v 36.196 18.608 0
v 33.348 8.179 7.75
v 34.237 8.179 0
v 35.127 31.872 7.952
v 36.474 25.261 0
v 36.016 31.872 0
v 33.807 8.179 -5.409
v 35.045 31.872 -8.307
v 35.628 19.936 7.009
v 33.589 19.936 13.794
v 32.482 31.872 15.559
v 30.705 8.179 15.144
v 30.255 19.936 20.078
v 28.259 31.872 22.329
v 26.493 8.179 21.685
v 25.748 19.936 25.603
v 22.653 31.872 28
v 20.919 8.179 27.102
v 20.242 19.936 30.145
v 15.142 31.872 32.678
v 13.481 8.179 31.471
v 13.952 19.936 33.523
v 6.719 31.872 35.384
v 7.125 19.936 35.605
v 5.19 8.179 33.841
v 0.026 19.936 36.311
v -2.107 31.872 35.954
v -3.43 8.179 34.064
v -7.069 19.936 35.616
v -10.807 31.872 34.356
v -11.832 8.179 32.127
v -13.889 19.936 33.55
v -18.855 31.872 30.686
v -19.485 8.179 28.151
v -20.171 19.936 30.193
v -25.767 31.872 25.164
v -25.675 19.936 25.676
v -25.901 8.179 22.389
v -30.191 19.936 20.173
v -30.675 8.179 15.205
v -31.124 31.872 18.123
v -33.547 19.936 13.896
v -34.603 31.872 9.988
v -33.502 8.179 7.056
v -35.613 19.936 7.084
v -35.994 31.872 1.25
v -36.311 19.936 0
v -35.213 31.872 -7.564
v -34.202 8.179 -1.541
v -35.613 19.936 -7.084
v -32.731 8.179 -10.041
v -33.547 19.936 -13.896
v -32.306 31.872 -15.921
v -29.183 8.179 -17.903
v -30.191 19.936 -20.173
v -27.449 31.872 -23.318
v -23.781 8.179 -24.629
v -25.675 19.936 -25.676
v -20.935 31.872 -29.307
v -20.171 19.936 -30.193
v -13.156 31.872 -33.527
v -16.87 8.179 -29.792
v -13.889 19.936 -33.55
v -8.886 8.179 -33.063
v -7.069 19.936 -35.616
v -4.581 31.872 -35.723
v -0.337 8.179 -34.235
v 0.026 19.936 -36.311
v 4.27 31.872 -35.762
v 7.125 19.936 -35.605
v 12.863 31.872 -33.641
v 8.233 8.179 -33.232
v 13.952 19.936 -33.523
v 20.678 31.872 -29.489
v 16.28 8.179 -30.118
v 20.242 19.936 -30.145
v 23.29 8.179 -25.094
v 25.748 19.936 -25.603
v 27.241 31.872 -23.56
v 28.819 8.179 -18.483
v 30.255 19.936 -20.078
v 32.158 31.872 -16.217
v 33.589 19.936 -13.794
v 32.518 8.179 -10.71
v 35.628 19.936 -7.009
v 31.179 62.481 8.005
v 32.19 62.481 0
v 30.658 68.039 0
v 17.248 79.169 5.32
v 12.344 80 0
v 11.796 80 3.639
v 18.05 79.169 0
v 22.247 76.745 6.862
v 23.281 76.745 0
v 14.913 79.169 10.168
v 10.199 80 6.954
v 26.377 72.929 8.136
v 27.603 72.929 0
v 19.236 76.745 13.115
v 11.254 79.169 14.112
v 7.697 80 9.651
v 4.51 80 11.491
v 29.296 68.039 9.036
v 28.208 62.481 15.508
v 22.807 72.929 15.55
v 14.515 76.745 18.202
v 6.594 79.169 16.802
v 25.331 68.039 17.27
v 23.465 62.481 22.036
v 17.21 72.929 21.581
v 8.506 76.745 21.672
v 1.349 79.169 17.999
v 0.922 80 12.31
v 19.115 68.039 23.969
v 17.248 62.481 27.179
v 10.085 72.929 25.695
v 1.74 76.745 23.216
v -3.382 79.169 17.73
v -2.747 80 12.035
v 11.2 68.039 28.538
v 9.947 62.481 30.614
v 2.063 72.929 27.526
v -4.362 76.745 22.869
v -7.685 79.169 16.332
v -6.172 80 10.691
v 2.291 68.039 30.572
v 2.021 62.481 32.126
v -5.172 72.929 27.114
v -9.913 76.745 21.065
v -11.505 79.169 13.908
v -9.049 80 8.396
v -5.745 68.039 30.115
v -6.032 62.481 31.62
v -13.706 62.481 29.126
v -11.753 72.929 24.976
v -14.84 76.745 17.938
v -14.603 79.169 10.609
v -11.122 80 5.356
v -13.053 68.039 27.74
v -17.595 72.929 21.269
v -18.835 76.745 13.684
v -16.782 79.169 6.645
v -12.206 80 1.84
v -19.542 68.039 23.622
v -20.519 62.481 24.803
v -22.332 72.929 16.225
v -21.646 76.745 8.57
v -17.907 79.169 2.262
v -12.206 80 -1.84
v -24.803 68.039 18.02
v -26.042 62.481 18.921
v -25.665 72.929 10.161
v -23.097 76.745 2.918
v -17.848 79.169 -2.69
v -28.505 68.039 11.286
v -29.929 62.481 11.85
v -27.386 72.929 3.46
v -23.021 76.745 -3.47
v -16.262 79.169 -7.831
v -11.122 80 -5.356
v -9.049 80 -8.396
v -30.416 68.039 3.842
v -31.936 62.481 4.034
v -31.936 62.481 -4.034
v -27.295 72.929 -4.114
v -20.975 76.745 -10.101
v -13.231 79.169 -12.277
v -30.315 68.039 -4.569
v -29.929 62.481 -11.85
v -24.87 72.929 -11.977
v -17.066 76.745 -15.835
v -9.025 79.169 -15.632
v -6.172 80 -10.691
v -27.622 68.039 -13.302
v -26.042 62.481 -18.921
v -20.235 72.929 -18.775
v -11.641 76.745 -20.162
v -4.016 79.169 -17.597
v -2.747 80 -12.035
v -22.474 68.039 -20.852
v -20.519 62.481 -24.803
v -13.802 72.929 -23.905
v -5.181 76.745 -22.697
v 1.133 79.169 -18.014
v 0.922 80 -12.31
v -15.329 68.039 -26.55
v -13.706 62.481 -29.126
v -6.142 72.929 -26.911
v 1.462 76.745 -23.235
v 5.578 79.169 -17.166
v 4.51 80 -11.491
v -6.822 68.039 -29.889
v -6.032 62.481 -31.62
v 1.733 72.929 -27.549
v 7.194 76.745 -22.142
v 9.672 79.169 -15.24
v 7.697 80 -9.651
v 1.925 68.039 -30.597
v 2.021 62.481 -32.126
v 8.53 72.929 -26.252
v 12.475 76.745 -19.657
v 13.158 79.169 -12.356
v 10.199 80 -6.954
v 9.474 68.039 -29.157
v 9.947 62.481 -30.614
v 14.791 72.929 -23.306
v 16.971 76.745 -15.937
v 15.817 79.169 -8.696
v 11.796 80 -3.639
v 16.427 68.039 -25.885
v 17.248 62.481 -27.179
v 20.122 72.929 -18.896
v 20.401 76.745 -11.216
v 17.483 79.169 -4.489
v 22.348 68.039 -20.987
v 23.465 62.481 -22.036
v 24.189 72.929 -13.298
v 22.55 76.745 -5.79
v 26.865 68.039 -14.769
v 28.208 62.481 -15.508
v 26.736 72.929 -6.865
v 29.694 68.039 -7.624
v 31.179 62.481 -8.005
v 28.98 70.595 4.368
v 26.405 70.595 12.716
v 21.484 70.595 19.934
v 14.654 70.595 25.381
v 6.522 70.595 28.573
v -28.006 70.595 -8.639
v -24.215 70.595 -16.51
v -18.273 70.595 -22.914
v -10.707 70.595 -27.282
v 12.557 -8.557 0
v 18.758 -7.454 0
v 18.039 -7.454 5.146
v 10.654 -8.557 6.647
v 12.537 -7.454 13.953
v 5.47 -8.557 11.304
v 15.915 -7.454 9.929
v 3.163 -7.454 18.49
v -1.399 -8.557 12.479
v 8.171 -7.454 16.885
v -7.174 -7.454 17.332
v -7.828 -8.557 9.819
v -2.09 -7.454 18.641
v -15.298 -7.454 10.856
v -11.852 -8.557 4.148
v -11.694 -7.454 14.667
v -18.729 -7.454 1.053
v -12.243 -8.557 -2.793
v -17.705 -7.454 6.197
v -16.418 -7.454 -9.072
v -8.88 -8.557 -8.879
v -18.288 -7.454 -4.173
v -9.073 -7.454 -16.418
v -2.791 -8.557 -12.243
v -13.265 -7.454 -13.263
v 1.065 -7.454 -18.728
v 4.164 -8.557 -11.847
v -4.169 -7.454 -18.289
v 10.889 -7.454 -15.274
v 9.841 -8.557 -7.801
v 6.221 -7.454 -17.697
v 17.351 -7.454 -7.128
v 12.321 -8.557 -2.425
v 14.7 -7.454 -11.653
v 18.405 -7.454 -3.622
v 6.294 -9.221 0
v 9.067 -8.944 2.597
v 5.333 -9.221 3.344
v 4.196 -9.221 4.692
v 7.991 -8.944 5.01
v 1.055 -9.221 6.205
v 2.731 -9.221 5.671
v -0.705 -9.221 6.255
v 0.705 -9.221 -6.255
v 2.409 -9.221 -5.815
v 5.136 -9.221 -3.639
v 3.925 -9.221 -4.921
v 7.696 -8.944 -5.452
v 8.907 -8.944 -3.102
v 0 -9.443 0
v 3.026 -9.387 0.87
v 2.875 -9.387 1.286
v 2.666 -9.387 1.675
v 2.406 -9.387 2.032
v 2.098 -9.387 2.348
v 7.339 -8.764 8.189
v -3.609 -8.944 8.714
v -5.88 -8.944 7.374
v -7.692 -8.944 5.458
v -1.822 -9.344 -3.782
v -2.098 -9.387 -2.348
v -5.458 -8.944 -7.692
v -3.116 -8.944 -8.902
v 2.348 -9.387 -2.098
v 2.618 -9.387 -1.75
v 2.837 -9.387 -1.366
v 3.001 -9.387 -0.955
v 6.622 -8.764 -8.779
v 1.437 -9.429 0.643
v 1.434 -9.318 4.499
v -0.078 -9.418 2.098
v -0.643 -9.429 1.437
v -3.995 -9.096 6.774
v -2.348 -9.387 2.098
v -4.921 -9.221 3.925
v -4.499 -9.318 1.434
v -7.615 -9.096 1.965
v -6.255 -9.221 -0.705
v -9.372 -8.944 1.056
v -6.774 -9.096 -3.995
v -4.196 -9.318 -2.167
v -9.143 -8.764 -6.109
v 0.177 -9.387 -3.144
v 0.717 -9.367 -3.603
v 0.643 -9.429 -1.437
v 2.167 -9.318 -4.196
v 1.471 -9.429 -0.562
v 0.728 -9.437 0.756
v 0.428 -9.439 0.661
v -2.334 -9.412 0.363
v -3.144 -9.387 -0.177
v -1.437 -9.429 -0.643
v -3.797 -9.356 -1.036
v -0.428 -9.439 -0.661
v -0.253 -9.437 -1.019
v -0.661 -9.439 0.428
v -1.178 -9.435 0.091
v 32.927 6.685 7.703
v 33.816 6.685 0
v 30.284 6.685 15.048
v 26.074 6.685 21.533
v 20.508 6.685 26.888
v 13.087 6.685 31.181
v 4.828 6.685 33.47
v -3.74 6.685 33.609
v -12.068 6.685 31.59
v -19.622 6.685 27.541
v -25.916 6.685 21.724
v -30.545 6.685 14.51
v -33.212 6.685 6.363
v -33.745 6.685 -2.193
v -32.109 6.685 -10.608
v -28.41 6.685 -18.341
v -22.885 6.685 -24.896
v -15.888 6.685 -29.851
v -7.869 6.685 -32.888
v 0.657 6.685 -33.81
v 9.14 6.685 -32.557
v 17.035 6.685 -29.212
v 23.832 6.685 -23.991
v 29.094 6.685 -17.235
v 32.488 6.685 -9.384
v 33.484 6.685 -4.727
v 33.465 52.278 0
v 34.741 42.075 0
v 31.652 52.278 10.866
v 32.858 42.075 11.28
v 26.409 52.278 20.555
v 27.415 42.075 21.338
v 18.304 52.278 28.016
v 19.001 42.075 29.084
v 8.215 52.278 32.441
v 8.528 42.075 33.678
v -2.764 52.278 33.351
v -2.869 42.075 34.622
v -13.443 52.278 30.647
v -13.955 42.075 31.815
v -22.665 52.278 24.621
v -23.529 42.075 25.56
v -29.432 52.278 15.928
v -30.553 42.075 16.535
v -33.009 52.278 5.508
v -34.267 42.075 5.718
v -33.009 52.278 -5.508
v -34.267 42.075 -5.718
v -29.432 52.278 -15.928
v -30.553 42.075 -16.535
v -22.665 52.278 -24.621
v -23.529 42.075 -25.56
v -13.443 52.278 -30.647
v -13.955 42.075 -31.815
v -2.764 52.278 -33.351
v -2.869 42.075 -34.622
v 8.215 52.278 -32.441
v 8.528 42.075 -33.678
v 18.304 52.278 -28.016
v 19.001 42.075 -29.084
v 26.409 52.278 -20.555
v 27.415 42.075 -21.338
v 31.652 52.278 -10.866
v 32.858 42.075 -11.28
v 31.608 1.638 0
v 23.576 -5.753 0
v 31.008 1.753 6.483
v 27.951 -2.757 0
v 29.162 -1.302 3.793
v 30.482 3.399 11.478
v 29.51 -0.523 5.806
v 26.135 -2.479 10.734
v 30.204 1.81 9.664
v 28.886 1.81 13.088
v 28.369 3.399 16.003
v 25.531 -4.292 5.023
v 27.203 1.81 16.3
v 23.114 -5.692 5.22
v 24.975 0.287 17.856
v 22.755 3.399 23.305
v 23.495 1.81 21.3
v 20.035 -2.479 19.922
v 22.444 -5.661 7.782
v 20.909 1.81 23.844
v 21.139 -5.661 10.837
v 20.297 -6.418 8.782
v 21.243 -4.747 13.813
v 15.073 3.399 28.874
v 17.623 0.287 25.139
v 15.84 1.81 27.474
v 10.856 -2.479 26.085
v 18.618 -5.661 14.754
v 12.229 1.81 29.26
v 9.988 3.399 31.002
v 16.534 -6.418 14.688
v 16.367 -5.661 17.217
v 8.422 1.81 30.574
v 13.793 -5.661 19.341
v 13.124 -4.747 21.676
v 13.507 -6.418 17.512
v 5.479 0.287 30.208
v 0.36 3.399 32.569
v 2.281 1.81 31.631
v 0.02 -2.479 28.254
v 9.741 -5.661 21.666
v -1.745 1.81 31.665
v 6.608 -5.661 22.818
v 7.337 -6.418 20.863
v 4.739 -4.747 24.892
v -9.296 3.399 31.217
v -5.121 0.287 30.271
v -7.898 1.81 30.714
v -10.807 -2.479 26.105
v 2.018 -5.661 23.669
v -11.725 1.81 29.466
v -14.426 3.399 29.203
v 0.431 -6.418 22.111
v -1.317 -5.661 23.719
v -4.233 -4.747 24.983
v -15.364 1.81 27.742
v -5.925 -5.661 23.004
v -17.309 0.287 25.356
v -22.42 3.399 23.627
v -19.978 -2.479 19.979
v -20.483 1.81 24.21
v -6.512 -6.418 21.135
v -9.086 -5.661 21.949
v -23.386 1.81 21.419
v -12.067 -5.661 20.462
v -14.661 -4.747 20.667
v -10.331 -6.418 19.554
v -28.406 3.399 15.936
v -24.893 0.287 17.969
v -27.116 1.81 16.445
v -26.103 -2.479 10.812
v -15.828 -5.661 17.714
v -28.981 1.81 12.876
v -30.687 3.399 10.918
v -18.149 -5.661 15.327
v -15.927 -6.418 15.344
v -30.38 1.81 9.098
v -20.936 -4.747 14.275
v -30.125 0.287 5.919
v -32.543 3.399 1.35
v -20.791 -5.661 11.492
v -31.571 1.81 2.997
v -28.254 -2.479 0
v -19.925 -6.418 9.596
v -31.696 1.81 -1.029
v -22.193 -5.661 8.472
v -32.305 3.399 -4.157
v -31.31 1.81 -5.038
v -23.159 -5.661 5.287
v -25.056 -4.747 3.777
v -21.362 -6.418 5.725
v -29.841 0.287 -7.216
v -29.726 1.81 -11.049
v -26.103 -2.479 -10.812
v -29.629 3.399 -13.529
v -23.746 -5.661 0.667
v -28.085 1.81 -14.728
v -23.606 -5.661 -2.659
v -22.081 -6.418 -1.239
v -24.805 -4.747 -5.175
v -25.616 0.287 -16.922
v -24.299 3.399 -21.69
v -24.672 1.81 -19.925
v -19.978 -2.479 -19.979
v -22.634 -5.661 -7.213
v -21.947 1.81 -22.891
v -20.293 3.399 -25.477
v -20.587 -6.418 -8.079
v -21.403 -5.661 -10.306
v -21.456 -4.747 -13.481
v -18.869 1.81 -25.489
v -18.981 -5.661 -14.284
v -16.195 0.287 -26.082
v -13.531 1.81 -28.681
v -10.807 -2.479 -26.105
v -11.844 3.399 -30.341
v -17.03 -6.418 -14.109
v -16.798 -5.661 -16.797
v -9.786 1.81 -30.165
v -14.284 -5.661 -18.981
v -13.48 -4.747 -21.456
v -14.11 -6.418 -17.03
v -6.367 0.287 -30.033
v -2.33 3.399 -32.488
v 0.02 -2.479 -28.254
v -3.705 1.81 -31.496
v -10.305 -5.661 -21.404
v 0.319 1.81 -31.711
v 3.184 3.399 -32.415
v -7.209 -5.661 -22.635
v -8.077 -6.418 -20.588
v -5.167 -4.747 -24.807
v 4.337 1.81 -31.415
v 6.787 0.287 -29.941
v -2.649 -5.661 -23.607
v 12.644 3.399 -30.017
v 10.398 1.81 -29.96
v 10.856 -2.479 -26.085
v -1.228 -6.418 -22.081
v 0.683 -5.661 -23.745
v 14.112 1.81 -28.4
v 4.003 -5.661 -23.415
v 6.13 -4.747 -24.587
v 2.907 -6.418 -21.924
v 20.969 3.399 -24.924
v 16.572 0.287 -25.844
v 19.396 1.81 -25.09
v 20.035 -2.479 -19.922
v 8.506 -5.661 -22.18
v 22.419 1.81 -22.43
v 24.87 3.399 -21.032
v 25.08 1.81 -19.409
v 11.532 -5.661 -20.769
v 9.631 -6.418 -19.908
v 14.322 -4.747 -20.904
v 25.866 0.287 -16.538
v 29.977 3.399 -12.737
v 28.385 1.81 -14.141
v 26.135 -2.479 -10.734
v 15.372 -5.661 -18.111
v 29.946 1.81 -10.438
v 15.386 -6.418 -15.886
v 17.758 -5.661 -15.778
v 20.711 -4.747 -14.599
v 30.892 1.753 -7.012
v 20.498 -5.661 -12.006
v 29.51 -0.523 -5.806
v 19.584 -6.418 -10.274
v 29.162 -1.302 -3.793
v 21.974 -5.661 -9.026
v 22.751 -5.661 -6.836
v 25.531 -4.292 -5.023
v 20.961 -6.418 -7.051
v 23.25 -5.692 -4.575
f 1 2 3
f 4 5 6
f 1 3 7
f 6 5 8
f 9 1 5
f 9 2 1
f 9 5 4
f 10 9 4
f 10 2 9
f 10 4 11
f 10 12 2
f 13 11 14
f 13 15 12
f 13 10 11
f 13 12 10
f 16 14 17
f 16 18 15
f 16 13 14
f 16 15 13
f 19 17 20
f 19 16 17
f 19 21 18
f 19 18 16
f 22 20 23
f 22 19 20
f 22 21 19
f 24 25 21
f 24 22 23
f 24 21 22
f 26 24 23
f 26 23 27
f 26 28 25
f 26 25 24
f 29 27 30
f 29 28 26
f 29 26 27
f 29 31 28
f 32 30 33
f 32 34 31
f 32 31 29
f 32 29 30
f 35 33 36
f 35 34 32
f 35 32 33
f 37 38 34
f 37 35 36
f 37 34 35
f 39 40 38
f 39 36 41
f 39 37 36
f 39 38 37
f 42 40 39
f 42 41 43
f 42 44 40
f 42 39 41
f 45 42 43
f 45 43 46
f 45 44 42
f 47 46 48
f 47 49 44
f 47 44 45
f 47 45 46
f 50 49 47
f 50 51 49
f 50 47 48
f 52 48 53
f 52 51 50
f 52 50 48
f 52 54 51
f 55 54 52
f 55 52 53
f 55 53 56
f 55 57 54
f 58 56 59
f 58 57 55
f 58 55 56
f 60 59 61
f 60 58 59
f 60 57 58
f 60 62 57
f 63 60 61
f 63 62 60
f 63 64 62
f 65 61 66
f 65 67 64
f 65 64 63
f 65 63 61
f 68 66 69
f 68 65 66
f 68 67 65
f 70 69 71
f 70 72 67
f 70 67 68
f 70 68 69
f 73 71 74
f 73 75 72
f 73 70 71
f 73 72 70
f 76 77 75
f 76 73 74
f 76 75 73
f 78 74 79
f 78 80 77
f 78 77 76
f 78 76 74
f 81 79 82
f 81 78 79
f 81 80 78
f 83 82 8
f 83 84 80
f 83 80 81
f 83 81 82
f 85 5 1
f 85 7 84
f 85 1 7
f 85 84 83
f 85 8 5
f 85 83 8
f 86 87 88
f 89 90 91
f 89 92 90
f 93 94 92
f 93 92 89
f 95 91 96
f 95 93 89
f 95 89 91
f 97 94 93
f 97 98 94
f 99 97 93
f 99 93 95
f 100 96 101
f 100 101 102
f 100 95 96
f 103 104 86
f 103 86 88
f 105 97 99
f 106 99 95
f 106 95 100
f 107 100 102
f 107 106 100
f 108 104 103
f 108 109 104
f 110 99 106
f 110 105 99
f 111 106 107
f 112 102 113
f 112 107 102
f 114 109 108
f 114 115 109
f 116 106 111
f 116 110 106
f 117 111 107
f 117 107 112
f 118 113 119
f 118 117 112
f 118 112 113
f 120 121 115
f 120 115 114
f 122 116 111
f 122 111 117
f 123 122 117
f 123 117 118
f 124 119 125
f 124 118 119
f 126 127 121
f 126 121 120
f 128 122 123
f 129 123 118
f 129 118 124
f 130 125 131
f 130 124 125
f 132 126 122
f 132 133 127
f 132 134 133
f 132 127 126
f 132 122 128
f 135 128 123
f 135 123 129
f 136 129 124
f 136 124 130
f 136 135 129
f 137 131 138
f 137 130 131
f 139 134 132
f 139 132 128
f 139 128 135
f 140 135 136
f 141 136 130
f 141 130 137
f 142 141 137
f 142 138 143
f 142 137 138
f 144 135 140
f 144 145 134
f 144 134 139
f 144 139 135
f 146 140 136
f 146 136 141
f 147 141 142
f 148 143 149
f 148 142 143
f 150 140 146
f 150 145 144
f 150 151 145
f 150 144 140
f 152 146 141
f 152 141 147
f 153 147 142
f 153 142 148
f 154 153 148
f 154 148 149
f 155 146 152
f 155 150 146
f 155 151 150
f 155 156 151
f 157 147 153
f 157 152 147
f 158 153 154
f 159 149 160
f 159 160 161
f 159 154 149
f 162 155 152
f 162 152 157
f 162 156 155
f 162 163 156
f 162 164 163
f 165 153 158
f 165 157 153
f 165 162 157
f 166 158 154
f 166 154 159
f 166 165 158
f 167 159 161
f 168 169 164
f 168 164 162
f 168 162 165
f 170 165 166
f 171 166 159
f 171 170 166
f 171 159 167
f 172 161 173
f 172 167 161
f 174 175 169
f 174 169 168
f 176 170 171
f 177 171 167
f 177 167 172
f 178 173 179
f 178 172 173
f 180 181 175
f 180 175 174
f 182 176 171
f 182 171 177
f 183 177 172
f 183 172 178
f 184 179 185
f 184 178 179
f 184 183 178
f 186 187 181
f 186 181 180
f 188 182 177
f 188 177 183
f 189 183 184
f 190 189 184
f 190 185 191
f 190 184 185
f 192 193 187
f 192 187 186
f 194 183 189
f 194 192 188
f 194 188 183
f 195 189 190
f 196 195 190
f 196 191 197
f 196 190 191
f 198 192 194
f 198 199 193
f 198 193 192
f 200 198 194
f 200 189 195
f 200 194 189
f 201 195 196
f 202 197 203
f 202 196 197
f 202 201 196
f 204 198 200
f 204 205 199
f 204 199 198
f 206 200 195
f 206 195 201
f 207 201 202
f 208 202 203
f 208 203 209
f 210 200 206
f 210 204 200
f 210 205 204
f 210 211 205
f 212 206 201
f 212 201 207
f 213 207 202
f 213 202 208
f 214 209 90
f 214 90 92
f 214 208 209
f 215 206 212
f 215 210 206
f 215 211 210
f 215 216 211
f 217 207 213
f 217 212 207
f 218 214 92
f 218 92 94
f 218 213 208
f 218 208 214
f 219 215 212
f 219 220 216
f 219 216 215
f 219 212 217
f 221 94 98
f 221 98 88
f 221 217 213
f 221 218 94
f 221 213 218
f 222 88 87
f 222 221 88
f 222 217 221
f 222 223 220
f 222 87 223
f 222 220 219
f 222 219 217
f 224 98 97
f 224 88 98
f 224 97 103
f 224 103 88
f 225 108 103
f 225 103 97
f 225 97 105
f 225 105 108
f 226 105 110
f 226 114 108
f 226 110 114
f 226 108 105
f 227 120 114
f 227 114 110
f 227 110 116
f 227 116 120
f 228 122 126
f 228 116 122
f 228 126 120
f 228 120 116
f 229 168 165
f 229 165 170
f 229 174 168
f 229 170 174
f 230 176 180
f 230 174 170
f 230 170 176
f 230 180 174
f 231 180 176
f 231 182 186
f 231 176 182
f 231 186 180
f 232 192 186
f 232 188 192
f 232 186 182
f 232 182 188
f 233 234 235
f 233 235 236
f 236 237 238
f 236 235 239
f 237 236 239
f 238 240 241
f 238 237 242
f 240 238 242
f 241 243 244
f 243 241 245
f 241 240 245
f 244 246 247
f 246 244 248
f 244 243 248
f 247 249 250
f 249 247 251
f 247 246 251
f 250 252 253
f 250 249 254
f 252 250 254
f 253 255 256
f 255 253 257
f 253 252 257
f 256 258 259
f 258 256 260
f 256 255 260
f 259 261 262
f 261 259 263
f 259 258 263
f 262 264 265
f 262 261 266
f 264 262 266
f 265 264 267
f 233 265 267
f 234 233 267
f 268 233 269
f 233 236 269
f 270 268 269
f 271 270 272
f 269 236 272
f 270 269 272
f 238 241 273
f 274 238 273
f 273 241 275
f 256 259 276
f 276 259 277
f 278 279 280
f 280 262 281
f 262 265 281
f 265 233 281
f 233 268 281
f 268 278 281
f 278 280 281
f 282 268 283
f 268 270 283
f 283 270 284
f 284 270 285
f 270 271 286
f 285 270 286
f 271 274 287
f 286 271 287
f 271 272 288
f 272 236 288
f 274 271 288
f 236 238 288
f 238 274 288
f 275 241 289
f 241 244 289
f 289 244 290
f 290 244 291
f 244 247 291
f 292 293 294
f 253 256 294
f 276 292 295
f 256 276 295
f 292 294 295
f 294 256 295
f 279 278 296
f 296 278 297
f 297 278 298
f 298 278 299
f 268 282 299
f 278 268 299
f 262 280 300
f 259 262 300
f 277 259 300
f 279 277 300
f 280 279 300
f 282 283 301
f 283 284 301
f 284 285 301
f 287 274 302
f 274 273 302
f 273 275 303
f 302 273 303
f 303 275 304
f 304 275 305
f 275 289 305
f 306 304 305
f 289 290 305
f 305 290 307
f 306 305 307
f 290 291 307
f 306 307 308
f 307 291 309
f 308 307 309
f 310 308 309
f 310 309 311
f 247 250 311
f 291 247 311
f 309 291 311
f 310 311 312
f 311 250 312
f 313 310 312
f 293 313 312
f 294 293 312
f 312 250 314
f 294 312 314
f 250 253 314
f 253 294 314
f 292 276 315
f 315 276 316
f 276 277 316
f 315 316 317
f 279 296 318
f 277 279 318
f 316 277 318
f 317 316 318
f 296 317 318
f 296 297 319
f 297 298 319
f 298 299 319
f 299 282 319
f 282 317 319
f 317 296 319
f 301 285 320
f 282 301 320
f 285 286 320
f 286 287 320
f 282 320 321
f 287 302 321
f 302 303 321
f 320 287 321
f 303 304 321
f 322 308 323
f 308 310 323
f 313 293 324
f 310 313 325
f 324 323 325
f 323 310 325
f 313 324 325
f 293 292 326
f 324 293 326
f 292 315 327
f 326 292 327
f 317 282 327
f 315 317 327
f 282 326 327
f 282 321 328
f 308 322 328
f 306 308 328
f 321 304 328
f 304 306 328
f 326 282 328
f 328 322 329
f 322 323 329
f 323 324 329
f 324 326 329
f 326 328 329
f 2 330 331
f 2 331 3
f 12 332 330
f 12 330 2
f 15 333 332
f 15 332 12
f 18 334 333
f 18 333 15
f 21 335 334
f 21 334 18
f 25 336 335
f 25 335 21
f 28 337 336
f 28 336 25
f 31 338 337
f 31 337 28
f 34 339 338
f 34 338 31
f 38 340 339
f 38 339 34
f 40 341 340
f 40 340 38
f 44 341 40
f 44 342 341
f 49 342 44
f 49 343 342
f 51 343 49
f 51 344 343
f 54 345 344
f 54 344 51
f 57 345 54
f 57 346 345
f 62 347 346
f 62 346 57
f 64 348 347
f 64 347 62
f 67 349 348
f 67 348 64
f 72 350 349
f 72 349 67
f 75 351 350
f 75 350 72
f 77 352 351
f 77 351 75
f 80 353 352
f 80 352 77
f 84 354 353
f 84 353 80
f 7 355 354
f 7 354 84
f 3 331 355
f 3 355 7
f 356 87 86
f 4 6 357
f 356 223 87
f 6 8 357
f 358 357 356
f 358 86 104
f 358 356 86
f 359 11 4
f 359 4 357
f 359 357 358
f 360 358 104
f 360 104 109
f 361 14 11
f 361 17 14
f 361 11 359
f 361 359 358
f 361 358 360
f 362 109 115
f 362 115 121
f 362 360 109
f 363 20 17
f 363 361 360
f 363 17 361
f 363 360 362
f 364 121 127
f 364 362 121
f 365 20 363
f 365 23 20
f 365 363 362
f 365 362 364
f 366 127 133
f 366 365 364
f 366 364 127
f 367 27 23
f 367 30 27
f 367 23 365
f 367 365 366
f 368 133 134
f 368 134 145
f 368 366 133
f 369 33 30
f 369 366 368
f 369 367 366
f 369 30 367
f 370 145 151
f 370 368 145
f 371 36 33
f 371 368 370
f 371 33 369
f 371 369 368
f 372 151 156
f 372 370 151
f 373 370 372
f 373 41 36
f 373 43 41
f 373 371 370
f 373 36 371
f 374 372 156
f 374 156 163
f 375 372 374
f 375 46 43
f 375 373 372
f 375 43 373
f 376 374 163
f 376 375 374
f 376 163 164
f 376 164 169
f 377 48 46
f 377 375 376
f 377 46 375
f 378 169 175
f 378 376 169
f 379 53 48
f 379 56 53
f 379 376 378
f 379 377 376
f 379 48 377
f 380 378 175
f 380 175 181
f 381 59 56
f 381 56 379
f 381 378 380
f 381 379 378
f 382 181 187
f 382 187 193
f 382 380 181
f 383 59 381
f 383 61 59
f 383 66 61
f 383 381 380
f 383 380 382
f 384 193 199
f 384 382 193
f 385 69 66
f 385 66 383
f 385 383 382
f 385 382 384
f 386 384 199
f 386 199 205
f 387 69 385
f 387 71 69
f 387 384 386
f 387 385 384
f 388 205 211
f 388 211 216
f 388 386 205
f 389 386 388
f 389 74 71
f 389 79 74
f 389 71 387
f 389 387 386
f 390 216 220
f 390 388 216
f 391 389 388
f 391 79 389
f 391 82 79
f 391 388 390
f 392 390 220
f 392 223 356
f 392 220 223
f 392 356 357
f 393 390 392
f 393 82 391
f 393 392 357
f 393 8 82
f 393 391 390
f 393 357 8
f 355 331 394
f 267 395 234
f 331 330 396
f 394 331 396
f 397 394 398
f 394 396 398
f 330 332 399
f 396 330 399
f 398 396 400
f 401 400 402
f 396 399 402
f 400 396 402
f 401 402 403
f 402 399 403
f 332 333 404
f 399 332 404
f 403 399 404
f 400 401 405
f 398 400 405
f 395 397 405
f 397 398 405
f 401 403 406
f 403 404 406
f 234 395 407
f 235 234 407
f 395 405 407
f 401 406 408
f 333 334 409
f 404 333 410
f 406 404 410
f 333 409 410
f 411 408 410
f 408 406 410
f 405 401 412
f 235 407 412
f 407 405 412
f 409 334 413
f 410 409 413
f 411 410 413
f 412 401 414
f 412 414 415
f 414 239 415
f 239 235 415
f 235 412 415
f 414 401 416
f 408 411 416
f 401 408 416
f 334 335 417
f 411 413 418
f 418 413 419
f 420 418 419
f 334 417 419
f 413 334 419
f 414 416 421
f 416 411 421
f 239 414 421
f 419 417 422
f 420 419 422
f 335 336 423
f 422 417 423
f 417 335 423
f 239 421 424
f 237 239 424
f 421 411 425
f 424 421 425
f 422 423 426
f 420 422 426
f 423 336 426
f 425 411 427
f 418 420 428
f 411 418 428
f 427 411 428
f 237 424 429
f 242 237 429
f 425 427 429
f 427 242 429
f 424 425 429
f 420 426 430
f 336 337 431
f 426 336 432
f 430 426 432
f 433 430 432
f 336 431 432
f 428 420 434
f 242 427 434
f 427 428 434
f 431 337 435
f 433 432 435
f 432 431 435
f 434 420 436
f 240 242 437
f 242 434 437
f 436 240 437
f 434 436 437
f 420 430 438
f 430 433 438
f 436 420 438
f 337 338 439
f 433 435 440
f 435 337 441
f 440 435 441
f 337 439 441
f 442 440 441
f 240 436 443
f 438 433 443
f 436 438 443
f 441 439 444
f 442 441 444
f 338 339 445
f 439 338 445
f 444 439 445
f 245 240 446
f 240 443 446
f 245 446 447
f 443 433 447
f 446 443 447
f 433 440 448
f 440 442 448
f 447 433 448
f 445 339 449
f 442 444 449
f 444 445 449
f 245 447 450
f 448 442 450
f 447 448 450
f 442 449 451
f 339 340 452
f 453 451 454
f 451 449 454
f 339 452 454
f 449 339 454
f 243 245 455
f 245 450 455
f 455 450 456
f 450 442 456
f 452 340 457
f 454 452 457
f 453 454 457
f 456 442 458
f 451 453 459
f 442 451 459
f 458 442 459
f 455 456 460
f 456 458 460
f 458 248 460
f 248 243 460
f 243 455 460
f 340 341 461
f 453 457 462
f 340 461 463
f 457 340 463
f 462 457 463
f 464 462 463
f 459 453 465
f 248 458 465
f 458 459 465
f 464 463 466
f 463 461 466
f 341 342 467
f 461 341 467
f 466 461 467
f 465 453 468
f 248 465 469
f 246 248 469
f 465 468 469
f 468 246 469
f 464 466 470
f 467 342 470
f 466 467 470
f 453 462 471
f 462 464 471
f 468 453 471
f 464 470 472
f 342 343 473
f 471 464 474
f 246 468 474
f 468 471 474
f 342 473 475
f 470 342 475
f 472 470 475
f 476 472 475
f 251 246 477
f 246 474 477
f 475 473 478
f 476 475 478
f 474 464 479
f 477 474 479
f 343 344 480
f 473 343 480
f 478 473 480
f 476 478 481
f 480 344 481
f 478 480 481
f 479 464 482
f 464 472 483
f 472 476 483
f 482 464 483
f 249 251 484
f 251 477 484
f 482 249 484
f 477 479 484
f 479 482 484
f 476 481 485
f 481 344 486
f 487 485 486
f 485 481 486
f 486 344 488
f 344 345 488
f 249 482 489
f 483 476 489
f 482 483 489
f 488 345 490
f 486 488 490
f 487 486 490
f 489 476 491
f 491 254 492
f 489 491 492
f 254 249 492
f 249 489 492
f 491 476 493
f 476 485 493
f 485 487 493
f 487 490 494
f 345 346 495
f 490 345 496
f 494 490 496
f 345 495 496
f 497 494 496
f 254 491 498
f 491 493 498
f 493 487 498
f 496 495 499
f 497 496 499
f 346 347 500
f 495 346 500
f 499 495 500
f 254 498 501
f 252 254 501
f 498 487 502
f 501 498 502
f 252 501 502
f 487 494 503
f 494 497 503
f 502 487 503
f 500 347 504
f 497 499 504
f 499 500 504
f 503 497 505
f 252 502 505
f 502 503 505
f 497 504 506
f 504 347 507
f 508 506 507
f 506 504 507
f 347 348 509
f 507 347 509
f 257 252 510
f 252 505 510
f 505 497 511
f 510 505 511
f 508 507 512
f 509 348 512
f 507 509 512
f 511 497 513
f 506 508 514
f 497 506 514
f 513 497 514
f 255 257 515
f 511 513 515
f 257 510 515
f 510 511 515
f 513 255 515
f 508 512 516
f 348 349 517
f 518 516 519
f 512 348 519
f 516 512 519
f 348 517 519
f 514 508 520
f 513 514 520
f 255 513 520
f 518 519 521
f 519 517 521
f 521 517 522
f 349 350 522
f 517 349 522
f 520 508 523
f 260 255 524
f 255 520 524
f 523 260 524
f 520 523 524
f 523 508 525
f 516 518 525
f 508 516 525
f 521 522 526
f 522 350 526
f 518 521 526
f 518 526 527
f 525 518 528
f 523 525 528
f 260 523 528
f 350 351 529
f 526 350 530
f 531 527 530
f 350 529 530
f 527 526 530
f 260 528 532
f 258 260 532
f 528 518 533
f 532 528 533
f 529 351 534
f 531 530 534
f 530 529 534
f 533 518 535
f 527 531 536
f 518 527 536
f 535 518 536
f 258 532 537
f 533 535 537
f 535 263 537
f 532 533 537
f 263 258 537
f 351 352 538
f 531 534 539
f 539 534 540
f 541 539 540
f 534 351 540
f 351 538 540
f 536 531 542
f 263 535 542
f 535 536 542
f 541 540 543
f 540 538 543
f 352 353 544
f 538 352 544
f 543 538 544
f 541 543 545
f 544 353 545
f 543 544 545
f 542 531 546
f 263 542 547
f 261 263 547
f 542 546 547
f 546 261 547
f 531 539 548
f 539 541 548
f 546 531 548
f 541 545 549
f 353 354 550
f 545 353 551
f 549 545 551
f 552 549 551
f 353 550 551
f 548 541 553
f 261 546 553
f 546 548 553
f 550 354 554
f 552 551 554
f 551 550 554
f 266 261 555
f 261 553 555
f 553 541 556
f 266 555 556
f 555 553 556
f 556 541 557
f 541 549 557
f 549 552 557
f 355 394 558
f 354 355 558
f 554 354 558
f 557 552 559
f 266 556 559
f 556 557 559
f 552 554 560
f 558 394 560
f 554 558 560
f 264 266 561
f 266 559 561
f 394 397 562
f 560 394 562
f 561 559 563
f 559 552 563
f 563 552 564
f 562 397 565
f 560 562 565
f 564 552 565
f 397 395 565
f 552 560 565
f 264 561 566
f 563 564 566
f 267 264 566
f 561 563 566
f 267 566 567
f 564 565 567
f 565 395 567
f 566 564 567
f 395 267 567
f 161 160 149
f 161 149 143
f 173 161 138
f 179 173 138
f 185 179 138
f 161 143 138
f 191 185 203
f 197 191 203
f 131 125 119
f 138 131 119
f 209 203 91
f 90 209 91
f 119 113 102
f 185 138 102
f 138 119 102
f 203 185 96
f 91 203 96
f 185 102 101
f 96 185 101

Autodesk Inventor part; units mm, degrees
ref_plane "YZ Plane" through (0, 0, 0) normal (1, 0, 0) x (0, 1, 0)
ref_plane "XZ Plane" through (0, 0, 0) normal (0, 1, 0) x (-1, 0, 0)
ref_plane "XY Plane" through (0, 0, 0) normal (0, 0, 1) x (1, 0, 0)
sketch "Sketch1" plane through (0, 0, 0) normal (0, 0, 1) x (1, 0, 0)
  line L0 (0, 0) -> (40, 0)
  arc A0 (0, -9.4427) -> (40, 0) centre (0, 80) ccw
  line L1 (40, 0) -> (30, 80)
  line L2 (30, 80) -> (0, 80)
  line L3 (0, 80) -> (0, -9.4427)
  dimension "d0" = 40
  dimension "d1" = 80
  dimension "d2" = 30
revolve "Revolution1" add sketch "Sketch1" angle 360 about axis through (0, 80, 0) along (0, -1, 0)
fillet "Fillet1" radius 20 1 edges at (-30, 80, 0)
chamfer "Chamfer1" distance 10 distance2 20 1 edges at (-40, 0, 0) measured on face at (-36.1941, -1.4854, 7.0791)
fillet "Fillet2" radius 20 1 edges at (-30.8197, -3.9651, 0)
fillet "Fillet3" radius 60 1 edges at (-37.5193, 19.8456, 0)
properties part number "body_ref"
